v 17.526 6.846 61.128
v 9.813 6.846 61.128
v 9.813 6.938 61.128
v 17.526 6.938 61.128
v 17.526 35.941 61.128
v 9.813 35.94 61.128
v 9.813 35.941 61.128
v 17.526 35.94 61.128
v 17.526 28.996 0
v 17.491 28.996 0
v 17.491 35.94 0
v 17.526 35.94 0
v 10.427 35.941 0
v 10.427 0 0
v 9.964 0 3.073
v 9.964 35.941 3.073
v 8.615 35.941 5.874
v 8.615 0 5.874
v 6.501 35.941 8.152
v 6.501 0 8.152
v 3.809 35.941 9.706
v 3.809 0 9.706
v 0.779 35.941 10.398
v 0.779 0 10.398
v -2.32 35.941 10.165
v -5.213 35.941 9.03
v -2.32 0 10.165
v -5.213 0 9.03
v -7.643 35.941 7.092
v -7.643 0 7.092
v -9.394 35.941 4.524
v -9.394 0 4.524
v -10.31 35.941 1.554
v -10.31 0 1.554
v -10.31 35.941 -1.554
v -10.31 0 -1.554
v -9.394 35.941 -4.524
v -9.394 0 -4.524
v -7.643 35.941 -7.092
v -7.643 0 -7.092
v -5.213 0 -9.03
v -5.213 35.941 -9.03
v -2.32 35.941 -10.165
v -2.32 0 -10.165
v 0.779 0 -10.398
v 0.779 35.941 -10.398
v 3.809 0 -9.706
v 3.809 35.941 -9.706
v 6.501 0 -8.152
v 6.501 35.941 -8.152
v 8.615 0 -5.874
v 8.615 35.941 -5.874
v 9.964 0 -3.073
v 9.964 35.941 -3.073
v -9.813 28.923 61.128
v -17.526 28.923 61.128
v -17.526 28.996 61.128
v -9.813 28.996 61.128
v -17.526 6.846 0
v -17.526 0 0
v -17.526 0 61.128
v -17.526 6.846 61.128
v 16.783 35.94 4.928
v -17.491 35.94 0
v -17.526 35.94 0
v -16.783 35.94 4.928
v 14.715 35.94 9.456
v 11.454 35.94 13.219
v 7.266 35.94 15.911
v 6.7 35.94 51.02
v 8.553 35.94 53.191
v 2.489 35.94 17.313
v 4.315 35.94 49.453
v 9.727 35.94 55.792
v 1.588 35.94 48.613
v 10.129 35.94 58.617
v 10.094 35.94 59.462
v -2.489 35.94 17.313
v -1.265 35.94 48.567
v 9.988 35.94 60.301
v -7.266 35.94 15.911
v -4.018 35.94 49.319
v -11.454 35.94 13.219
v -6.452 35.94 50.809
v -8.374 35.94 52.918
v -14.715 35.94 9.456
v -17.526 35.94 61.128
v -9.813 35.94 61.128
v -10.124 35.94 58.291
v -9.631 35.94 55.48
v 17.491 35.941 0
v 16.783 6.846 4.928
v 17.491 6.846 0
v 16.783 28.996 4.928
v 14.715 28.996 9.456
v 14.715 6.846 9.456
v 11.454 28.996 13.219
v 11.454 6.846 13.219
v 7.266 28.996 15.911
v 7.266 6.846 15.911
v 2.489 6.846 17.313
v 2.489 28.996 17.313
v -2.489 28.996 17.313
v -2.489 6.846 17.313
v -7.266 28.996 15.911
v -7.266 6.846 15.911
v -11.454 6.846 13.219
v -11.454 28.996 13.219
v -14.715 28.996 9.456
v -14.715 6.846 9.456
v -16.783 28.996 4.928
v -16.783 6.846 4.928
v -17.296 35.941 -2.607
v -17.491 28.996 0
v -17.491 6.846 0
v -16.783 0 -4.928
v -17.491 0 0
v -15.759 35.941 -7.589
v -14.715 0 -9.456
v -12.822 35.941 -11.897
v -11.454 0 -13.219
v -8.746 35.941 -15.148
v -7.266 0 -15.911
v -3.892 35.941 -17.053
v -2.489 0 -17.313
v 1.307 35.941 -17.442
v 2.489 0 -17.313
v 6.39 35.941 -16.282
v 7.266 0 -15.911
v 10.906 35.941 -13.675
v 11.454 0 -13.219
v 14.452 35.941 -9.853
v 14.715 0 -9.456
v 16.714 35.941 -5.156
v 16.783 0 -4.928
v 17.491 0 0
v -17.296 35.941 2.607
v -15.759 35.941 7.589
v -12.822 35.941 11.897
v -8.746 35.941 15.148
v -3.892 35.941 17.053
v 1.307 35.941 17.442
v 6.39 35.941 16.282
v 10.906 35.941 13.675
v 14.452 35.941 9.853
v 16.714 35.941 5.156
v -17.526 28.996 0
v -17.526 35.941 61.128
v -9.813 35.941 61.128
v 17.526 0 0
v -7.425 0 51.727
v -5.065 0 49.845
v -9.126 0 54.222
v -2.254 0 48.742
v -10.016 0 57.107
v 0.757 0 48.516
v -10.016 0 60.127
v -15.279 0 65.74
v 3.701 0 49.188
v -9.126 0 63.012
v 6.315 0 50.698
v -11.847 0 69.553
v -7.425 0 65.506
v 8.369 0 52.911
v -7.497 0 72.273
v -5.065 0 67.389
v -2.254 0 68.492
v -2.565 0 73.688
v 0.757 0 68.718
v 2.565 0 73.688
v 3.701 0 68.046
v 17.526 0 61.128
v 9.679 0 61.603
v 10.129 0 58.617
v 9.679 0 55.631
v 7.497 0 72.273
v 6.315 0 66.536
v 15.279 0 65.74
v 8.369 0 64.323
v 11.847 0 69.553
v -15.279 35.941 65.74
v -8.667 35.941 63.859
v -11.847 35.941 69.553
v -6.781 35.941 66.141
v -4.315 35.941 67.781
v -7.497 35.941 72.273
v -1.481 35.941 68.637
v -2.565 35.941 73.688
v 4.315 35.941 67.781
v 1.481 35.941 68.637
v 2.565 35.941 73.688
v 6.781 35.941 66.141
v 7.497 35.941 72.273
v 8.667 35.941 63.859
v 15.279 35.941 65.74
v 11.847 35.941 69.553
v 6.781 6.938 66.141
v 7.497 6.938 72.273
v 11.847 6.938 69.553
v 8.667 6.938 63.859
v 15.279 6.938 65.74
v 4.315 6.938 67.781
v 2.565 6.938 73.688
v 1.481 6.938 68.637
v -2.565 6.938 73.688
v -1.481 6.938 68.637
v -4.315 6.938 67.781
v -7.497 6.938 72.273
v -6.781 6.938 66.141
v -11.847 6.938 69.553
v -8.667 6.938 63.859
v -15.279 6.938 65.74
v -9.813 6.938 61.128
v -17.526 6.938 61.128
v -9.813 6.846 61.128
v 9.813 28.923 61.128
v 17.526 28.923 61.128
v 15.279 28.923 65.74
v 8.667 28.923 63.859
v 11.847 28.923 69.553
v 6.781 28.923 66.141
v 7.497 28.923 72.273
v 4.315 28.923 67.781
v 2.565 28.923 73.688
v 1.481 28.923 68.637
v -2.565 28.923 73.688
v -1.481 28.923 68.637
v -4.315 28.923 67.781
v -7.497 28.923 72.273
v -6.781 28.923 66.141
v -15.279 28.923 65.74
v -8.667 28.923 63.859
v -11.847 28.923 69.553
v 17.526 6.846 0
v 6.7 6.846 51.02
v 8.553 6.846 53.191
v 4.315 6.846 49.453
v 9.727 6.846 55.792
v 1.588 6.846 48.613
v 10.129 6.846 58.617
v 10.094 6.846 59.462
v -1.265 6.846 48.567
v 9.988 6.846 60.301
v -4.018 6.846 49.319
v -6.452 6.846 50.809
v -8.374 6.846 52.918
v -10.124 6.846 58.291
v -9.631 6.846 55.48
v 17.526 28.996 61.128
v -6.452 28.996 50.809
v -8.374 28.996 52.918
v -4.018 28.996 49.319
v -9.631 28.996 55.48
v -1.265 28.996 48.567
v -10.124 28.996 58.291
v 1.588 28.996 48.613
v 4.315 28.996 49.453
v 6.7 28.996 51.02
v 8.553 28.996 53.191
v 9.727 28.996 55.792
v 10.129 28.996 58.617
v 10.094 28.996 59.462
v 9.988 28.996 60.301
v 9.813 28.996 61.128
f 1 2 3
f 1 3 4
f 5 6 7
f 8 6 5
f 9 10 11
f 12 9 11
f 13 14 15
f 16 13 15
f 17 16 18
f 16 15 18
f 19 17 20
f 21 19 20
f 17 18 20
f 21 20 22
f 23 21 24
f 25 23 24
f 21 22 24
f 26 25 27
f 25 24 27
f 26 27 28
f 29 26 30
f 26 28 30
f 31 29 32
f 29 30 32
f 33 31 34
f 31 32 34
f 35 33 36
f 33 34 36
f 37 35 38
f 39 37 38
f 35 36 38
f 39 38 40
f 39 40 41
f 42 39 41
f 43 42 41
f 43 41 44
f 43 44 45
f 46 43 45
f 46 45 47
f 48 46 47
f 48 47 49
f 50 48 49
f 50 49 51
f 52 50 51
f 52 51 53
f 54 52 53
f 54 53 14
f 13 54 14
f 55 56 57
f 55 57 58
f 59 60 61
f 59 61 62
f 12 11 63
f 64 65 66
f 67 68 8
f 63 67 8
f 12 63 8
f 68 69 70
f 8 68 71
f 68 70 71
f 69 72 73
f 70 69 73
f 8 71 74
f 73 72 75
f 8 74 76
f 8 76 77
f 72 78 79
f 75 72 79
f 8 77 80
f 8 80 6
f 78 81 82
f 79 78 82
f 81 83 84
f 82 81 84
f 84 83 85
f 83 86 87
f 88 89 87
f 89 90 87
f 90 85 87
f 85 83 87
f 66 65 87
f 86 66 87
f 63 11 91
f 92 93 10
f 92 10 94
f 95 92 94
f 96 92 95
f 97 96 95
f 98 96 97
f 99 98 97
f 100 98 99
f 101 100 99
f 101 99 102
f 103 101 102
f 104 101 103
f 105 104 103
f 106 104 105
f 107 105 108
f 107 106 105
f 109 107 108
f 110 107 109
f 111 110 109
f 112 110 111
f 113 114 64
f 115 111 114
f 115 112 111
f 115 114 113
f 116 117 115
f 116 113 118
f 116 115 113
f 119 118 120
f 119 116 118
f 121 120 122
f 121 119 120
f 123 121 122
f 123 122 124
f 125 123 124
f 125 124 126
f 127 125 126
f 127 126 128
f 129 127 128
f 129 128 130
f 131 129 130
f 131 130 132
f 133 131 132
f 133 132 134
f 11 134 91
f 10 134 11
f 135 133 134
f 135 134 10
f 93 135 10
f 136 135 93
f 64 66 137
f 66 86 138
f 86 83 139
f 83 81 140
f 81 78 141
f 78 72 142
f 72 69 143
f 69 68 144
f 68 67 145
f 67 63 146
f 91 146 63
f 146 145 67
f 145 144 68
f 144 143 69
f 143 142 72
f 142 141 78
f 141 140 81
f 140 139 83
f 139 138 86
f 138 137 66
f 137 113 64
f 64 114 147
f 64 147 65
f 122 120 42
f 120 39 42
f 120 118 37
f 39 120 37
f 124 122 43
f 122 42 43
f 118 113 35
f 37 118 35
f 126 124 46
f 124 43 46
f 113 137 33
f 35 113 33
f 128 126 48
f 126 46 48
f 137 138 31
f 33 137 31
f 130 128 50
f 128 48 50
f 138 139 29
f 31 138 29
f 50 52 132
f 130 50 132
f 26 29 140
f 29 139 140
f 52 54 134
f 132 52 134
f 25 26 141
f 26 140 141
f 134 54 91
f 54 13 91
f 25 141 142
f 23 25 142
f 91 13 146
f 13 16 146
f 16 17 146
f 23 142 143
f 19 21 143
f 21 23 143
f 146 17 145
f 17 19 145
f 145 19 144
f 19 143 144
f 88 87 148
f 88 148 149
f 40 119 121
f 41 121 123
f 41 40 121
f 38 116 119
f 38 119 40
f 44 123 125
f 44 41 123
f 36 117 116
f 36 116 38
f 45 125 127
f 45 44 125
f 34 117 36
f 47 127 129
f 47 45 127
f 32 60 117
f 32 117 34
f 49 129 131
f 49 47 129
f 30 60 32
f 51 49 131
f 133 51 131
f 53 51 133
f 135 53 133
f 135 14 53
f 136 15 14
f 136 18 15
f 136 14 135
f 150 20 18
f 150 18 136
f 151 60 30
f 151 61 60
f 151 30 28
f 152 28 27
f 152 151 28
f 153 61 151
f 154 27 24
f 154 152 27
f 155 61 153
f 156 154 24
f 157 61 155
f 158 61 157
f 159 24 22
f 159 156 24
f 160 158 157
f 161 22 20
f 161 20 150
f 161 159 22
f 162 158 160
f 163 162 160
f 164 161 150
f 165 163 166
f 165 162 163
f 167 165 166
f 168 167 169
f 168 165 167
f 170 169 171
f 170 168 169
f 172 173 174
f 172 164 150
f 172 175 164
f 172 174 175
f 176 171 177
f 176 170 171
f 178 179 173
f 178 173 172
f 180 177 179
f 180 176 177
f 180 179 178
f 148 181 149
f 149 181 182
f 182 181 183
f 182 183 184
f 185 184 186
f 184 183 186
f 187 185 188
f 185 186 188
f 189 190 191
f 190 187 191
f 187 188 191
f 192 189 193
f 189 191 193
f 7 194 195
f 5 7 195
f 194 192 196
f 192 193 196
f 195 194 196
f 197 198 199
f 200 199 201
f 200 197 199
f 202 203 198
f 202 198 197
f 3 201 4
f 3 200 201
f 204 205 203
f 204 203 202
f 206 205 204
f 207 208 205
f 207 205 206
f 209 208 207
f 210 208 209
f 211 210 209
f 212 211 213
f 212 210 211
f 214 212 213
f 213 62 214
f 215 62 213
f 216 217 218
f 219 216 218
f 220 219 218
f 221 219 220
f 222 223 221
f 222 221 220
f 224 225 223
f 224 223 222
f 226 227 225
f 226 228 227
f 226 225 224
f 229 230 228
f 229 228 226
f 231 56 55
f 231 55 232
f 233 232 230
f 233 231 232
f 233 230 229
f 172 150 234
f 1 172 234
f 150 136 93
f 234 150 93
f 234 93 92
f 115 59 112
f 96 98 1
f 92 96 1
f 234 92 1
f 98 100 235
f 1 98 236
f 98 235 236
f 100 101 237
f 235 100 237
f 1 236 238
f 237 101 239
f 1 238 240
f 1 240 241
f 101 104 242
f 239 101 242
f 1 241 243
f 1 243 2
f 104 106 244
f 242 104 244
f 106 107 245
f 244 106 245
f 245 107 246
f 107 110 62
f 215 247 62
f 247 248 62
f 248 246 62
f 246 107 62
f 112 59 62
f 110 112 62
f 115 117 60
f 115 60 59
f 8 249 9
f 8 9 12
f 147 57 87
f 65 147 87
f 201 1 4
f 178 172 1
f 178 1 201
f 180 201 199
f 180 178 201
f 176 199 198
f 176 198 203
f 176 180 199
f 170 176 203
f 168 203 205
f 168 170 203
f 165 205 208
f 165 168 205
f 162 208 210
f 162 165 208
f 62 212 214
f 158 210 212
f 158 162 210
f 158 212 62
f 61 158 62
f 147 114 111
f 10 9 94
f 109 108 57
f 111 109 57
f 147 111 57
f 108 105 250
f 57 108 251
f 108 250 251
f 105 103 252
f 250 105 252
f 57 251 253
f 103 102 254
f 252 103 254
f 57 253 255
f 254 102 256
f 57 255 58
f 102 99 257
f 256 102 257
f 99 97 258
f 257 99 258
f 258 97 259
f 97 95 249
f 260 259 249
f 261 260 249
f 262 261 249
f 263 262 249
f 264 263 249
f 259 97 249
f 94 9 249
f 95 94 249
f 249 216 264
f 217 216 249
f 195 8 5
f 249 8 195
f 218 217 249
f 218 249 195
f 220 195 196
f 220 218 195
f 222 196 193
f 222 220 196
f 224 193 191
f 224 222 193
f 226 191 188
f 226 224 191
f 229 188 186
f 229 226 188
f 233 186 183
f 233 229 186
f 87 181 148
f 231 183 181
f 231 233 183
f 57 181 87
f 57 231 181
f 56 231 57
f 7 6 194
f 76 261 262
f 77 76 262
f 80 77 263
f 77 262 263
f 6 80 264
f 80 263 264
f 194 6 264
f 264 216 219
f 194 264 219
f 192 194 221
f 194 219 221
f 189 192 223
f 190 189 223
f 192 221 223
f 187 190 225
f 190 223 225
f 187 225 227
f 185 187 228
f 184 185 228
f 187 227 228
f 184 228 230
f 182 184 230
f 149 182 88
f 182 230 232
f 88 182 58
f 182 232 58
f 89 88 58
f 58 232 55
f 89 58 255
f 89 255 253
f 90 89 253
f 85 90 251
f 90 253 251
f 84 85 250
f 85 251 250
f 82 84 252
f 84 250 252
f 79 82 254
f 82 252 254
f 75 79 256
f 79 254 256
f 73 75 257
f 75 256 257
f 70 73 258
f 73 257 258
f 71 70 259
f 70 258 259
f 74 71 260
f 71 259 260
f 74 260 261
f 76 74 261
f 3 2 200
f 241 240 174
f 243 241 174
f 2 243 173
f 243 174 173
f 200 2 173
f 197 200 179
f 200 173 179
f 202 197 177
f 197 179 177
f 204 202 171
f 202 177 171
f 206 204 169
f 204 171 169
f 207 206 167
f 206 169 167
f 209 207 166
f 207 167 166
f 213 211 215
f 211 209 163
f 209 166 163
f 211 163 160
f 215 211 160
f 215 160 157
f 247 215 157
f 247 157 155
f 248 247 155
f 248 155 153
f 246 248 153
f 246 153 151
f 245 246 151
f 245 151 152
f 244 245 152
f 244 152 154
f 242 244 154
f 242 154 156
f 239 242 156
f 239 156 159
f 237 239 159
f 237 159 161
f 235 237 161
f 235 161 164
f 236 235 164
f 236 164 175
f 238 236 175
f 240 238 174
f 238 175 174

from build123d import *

# Parameters (mm, degrees)
F0_R           = 17.4912065647
F2_DEPTH       = 35.941
F1_W           = 6.9445110857
F1_H           = 61.1279271543
F3_DEPTH       = 17.526
F3_DEPTH_BACK  = 17.526
F1_W_2         = 6.845775526
F4_DEPTH       = 17.526
F4_DEPTH_BACK  = 17.526
F6_DEPTH       = 35.941
F8_DEPTH       = 25.4
F8_DEPTH_BACK  = 25.4
F9_R           = 10.1290533854
F9_R_2         = 10.4269018425
F10_DEPTH      = 38.1
F10_DEPTH_BACK = 38.1


with BuildPart() as f2:
    # F0 (on Front) → F2 (new body)
    with BuildSketch(Plane.XZ):
        Circle(F0_R)
    extrude(amount=-F2_DEPTH)

    # F1 (on Right) → F3 (join, two sides)
    with BuildSketch(Plane.YZ) as f3_sk:
        with Locations((32.4680674821, 30.5639635772)):
            Rectangle(F1_W, F1_H)
    extrude(amount=F3_DEPTH)
    extrude(f3_sk.sketch, amount=-F3_DEPTH_BACK)

    # F1 (on Right) → F4 (join, two sides)
    with BuildSketch(Plane.YZ) as f4_sk:
        with Locations((3.422887763, 30.5639635772)):
            Rectangle(F1_W_2, F1_H)
        with Locations((32.4680674821, 30.5639635772)):
            Rectangle(F1_W, F1_H)
    extrude(amount=F4_DEPTH)
    extrude(f4_sk.sketch, amount=-F4_DEPTH_BACK)

    # F5 (on face) → F6 (join)
    with BuildSketch(Plane.XZ):
        with BuildLine():
            Line((-17.526, 61.1279271543), (17.526, 61.1279271543))
            ThreePointArc((17.526, 61.1279271543), (0, 73.8669370431), (-17.526, 61.1279271543))
        make_face()
    extrude(amount=-F6_DEPTH)

    # F7 (on Right) → F8 (cut, two sides)
    with BuildSketch(Plane.YZ) as f8_sk:
        Polygon((6.9377436303, 74.695661664), (6.9377436303, 60.9454773366), (28.9229359478, 60.8699284494), (28.9229359478, 74.2423608899), align=None)
    extrude(amount=F8_DEPTH, mode=Mode.SUBTRACT)
    extrude(f8_sk.sketch, amount=-F8_DEPTH_BACK, mode=Mode.SUBTRACT)

    # F9 (on face) → F10 (cut, two sides)
    with BuildSketch(Plane.XZ) as f10_sk:
        with Locations((0, 58.616951108)):
            Circle(F9_R)
        Circle(F9_R_2)
    extrude(amount=F10_DEPTH, mode=Mode.SUBTRACT)
    extrude(f10_sk.sketch, amount=-F10_DEPTH_BACK, mode=Mode.SUBTRACT)


solid = f2.part
